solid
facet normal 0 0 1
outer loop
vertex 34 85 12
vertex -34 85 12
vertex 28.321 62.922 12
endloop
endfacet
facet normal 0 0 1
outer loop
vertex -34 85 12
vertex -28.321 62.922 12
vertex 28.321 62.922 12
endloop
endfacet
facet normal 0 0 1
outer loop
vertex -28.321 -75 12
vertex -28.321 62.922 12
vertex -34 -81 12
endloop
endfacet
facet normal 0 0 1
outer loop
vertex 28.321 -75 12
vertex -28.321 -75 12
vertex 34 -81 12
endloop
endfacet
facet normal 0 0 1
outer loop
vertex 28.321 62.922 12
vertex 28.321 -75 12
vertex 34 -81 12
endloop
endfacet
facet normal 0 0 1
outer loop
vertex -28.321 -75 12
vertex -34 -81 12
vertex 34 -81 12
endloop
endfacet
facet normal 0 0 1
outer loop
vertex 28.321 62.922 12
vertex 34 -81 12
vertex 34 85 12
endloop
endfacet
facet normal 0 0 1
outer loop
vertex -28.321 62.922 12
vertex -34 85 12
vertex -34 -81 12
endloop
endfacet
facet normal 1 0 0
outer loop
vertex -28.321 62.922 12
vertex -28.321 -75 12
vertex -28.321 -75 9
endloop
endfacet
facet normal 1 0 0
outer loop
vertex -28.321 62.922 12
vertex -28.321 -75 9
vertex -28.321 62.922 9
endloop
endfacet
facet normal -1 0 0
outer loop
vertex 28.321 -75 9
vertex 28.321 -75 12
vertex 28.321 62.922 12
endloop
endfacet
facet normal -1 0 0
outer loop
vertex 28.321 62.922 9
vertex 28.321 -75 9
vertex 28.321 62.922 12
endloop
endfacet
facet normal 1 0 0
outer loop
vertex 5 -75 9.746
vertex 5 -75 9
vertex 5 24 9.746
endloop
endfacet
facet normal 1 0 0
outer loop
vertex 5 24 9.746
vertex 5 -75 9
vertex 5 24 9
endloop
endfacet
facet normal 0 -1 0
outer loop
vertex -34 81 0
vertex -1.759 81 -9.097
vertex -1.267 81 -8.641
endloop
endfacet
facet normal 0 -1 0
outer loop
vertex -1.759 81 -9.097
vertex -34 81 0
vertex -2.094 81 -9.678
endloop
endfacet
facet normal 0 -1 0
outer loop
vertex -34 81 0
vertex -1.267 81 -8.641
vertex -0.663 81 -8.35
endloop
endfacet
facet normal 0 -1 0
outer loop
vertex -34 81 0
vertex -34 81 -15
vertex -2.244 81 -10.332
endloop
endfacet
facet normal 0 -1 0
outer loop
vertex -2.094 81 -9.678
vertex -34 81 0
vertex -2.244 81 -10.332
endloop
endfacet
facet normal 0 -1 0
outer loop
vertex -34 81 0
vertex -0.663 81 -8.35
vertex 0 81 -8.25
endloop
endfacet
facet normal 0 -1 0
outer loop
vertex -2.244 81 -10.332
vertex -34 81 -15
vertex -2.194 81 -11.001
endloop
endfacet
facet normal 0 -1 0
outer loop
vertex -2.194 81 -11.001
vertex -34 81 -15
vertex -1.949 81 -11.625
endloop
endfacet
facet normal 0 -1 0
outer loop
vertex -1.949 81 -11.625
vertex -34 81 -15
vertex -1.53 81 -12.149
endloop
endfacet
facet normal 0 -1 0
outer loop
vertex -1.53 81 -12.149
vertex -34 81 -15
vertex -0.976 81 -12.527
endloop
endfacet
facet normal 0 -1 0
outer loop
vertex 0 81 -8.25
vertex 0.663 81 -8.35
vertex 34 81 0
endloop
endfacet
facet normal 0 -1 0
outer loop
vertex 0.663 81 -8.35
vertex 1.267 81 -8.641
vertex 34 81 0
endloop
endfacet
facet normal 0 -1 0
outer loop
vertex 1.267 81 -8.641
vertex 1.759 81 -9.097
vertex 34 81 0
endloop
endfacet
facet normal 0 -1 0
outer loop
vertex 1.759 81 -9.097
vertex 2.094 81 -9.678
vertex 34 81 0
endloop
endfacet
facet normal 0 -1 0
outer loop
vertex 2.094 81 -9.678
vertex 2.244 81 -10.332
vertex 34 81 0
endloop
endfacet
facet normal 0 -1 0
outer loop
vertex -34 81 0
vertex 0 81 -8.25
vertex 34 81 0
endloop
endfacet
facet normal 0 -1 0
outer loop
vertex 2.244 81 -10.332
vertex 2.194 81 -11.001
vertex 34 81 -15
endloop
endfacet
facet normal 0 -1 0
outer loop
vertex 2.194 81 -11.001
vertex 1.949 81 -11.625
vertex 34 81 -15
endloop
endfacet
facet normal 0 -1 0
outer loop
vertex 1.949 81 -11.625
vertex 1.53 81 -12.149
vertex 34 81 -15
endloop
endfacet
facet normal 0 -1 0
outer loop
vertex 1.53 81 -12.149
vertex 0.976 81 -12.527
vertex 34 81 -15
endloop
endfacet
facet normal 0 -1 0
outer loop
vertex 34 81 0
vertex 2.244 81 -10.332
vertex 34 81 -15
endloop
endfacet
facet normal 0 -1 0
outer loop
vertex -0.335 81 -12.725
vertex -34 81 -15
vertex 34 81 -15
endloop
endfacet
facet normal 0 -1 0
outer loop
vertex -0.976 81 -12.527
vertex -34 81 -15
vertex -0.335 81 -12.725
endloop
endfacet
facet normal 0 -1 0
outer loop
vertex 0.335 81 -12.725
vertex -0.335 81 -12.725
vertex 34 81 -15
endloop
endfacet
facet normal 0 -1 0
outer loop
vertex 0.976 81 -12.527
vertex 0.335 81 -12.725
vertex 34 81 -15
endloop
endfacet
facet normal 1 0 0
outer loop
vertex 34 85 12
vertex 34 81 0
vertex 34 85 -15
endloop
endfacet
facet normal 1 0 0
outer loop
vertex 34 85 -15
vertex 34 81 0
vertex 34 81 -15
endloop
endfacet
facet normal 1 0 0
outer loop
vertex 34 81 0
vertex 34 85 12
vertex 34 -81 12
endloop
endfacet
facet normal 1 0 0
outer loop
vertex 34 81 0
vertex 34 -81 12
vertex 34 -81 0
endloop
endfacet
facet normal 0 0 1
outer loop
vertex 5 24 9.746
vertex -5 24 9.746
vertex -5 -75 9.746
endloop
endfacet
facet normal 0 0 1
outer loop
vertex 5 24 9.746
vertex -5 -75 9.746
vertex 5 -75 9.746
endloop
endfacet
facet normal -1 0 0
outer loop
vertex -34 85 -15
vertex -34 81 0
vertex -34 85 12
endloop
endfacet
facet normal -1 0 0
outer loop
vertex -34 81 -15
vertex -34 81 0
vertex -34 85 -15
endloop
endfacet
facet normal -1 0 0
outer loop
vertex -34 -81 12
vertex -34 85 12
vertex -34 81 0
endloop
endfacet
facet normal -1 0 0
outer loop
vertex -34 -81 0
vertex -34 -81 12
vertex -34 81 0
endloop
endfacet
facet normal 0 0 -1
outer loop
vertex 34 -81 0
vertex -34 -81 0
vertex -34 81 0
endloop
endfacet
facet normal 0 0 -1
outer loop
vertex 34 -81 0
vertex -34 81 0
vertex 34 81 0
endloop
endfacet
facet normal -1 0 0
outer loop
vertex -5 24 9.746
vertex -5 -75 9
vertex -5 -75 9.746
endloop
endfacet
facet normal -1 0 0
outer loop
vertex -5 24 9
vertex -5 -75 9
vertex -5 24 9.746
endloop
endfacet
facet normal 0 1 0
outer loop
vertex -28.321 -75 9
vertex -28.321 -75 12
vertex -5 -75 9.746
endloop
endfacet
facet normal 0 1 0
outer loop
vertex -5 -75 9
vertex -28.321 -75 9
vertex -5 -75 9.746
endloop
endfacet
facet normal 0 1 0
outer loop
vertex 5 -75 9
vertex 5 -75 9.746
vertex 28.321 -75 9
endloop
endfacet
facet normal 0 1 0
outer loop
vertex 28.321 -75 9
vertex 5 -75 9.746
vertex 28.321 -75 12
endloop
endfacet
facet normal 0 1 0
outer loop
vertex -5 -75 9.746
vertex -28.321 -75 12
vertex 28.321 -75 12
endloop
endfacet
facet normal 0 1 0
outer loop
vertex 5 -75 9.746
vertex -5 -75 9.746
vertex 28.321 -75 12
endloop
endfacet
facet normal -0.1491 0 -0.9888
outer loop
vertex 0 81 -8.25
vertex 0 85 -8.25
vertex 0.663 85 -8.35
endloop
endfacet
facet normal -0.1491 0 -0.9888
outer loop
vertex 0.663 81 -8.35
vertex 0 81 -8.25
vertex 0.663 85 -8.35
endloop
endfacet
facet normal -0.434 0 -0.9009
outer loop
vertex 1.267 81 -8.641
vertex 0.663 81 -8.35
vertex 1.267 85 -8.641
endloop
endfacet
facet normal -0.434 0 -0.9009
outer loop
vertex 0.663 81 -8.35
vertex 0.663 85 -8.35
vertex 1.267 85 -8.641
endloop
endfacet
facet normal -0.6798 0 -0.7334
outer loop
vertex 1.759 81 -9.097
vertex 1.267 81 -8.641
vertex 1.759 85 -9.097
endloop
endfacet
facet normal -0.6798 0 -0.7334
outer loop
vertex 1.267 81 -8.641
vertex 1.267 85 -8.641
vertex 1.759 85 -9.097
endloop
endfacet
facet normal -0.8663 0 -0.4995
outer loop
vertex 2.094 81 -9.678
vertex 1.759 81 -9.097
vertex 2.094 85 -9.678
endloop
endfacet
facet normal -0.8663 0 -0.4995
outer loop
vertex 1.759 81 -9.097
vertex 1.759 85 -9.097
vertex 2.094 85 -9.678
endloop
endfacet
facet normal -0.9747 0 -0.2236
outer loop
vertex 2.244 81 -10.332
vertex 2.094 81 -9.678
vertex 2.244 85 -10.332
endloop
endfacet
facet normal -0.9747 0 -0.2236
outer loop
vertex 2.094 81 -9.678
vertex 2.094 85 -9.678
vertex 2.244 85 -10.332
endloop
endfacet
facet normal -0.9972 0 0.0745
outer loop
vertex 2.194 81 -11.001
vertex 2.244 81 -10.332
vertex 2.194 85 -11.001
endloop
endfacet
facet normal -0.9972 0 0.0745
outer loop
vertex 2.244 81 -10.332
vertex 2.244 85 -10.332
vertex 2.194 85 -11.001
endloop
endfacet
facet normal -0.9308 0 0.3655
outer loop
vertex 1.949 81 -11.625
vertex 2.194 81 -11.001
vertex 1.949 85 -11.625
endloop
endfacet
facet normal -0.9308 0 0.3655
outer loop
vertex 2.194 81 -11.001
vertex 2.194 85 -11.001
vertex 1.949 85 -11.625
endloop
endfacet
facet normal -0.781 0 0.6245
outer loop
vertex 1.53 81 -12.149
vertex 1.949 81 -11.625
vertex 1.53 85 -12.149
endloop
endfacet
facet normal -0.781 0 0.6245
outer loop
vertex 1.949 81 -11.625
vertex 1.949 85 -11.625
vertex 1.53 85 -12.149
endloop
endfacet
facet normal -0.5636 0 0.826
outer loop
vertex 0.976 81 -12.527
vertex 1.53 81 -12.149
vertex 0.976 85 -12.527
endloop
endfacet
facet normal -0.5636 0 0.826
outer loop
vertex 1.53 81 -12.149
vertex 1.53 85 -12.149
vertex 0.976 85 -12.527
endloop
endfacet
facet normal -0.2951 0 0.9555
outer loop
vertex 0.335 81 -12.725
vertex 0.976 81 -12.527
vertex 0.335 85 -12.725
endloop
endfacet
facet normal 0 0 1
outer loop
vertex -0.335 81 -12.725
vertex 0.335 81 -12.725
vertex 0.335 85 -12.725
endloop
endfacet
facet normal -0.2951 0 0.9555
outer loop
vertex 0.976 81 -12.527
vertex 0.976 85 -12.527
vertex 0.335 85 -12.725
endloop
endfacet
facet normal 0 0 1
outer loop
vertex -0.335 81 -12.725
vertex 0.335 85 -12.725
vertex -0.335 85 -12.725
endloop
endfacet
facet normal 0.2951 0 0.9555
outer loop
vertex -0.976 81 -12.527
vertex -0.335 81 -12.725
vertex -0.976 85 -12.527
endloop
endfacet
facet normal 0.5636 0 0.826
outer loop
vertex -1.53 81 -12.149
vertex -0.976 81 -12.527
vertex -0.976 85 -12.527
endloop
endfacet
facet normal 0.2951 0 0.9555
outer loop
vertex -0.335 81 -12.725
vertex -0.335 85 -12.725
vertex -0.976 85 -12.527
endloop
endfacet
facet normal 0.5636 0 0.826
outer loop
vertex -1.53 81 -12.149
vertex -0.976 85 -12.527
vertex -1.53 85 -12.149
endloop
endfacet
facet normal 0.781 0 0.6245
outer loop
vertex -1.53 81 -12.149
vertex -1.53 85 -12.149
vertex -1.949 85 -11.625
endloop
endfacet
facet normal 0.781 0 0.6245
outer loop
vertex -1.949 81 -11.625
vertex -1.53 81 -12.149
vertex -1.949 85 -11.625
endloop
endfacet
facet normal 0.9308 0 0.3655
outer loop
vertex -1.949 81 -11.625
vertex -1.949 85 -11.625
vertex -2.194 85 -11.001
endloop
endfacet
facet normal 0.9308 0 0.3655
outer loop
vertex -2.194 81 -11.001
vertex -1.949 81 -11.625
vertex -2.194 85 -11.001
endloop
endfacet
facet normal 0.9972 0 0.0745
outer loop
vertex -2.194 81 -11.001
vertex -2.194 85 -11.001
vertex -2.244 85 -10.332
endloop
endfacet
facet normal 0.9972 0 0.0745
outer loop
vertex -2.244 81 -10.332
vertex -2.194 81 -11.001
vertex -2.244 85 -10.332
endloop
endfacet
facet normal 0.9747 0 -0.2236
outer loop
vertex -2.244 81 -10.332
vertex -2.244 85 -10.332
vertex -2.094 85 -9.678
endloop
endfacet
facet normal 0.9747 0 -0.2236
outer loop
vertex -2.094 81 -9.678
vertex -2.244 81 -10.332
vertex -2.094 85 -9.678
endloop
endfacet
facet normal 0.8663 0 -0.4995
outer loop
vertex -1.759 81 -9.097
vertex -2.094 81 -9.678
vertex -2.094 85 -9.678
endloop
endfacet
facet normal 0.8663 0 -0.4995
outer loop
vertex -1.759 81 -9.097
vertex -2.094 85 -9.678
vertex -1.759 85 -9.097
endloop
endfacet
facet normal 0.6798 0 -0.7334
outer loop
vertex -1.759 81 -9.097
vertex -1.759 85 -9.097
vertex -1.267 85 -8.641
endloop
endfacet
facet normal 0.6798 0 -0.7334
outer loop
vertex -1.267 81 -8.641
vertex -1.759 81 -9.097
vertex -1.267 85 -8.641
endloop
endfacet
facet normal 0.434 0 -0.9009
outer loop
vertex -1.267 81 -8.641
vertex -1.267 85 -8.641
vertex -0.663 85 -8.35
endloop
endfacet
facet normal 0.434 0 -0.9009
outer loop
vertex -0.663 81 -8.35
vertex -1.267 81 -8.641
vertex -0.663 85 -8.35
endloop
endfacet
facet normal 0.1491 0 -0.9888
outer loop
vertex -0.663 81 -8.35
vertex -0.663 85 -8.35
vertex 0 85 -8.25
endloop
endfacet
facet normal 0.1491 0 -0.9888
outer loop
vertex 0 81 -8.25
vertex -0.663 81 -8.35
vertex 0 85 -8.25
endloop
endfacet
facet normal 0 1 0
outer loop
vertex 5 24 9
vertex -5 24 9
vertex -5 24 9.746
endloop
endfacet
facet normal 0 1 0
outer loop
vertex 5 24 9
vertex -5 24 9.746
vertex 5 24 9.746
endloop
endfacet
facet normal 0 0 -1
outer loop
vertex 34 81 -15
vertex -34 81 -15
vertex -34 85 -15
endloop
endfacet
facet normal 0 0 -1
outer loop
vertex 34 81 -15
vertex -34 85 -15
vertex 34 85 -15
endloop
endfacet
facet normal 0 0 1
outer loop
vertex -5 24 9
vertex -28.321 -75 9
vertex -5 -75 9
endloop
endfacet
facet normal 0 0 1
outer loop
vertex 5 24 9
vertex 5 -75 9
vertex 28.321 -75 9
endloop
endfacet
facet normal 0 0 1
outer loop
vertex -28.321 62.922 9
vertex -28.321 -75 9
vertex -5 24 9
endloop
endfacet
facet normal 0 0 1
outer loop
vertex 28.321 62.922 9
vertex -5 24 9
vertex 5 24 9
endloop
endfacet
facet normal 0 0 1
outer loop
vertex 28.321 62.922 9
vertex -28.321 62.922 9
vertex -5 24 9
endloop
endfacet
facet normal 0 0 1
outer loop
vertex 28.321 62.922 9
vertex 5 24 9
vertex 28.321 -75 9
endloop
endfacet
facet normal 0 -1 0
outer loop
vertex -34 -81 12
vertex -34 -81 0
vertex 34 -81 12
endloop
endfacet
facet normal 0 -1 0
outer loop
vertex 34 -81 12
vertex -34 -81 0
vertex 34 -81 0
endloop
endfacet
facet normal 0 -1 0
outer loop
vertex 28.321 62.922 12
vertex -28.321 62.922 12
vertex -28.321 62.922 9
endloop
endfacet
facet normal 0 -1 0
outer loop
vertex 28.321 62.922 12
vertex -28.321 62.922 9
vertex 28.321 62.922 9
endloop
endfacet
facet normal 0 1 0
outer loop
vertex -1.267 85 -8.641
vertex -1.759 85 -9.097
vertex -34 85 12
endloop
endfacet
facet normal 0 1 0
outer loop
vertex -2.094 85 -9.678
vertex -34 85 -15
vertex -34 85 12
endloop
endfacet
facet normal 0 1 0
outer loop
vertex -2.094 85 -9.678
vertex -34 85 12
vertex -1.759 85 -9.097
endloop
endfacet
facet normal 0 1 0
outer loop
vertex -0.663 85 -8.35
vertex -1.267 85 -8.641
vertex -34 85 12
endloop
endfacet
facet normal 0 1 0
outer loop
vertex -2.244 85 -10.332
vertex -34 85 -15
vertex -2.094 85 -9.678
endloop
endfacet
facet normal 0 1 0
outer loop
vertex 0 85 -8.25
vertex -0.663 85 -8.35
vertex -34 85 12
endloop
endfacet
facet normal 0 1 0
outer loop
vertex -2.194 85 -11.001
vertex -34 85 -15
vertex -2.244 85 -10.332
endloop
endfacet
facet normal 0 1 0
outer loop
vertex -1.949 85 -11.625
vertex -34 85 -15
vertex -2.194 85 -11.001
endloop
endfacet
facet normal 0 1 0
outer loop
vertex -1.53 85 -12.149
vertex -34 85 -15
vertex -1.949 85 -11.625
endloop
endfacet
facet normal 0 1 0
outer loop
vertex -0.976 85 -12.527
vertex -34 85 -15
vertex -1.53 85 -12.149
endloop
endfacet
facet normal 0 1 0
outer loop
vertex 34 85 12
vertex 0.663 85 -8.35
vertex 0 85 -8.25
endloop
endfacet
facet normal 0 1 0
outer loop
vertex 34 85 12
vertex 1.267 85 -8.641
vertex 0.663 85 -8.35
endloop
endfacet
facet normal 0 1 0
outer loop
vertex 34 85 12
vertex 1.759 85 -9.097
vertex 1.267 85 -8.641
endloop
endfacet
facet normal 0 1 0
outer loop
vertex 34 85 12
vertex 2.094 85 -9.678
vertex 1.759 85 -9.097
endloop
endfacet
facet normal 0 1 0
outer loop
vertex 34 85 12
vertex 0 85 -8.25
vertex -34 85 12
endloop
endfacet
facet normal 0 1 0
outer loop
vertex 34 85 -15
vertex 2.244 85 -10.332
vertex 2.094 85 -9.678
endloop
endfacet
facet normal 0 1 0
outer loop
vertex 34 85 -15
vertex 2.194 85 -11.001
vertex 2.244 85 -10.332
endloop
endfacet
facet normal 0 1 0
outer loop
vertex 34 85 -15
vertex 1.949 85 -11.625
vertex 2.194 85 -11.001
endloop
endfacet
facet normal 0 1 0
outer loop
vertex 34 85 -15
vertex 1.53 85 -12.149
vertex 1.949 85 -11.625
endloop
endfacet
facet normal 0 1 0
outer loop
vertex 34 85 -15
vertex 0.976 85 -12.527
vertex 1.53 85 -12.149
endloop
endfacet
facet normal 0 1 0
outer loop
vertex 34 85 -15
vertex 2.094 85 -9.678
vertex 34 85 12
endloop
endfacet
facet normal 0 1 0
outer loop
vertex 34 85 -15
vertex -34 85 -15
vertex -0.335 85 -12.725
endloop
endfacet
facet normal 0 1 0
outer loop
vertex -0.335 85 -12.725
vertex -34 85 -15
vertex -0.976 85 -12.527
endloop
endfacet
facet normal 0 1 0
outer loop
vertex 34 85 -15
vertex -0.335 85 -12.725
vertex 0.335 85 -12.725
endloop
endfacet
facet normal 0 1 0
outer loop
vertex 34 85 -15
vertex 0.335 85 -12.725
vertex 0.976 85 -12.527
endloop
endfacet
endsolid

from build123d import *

# Parameters (mm, degrees)
SKETCH1_W           = 68
SKETCH1_H           = 162
BOSS_EXTRUDE1_DEPTH = 12
SKETCH2_W           = 68
SKETCH2_H           = 27
BOSS_EXTRUDE2_DEPTH = 4
SKETCH4_R           = 2.25
CUT_EXTRUDE1_DEPTH  = 171.108788721
SKETCH5_W           = 56.642
SKETCH5_H           = 137.922
CUT_EXTRUDE2_DEPTH  = 3
SKETCH6_W           = 10
SKETCH6_H           = 99
BOSS_EXTRUDE3_DEPTH = 0.746


with BuildPart() as part:
    # Sketch1 → Boss-Extrude1 (new body)
    with BuildSketch(Plane.XY):
        Rectangle(SKETCH1_W, SKETCH1_H)
    extrude(amount=BOSS_EXTRUDE1_DEPTH)

    # Sketch2 → Boss-Extrude2 (add)
    with BuildSketch(Plane(origin=(0, 81, 0), x_dir=(1, 0, 0), z_dir=(0, 1, 0))):
        with Locations((0, 1.5)):
            Rectangle(SKETCH2_W, SKETCH2_H)
    extrude(amount=BOSS_EXTRUDE2_DEPTH)

    # Sketch4 → Cut-Extrude1 (cut, through all)
    with BuildSketch(Plane(origin=(0, 85, 0), x_dir=(1, 0, 0), z_dir=(0, 1, 0))):
        with Locations(Location((0, 10.5, 0), (0, 0, 270))):
            Circle(SKETCH4_R)
    extrude(amount=-CUT_EXTRUDE1_DEPTH, mode=Mode.SUBTRACT)

    # Sketch5 → Cut-Extrude2 (cut)
    with BuildSketch(Plane.XY.offset(12)):
        with Locations((0, -6.039)):
            Rectangle(SKETCH5_W, SKETCH5_H)
    extrude(amount=-CUT_EXTRUDE2_DEPTH, mode=Mode.SUBTRACT)

    # Sketch6 → Boss-Extrude3 (add)
    with BuildSketch(Plane.XY.offset(9)):
        with Locations((0, -25.5)):
            Rectangle(SKETCH6_W, SKETCH6_H)
    extrude(amount=BOSS_EXTRUDE3_DEPTH)


solid = part.part
